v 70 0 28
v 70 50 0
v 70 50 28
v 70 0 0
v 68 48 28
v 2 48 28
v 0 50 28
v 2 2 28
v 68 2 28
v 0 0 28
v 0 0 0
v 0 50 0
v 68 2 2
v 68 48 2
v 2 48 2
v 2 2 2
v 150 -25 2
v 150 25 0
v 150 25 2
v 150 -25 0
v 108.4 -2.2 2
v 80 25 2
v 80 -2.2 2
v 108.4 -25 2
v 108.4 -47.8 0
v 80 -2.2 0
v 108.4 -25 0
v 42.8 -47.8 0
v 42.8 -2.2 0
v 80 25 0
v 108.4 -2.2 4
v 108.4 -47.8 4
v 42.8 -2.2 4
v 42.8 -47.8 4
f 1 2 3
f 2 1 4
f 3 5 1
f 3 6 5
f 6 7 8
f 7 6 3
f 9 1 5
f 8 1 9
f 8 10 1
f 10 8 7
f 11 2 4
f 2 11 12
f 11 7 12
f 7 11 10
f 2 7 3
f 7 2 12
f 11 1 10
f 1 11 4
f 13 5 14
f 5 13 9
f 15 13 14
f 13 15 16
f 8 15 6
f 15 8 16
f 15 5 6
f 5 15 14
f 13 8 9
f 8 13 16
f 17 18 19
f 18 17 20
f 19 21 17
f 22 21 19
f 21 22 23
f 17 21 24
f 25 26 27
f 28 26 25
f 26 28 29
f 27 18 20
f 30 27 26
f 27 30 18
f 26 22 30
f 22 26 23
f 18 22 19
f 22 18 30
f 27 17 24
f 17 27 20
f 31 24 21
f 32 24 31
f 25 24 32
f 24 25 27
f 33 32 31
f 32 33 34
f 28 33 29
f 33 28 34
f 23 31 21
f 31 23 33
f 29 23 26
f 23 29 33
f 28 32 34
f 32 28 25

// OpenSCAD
// Two-part enclosure for a small electronics board (e.g. Arduino-based temperature logger)
// Print orientation: box standing on its floor, lid printed upside down on the +X side.
// Both parts are in the same file, side by side on the bed, with a 10 mm gap between them.

// ---------------- Parameters ----------------
box_x      = 70;    // box outer length (X)
box_y      = 50;    // box outer width (Y)
box_z      = 30;    // box outer height (Z)
wall       = 2;     // box wall thickness
floor      = 2;     // box floor thickness (separate from walls for clarity)

lip_t      = 1.5;   // lid wall thickness
lip_h      = 4;     // lid wall height (extends above the 2 mm plate)
lip_x      = 65.6;  // lid outer length (X), 4.4 mm clearance inside box
lip_y      = 45.6;  // lid outer width (Y), 4.4 mm clearance inside box
plate      = 70;    // lid plate length (X)
plate_w    = 50;    // lid plate width (Y)

eps        = 0.5;   // cutter overshoot past faces

$fn = 64;

// ---------------- Model ----------------
union() {
    // Part 1: Box (open top)
    difference() {
        cube([box_x, box_y, box_z - floor]);   // outer shell above floor
        translate([wall, wall, floor])
            cube([box_x - 2 * wall, box_y - 2 * wall, box_z - floor + 0.01]); // hollow, open top
    }

    // Part 2: Lid (printed upside down: plate on bed, lip pointing up)
    translate([box_x + 10, -plate_w / 2, 0])
        union() {
            cube([plate, plate_w, 2]);                      // base plate
            translate([-plate + lip_x / 2, -lip_y / 2, 0])
                cube([lip_x, lip_y, lip_h]);                    // lip/overhang (65.6 x 45.6, 4 mm tall)
        }
}
